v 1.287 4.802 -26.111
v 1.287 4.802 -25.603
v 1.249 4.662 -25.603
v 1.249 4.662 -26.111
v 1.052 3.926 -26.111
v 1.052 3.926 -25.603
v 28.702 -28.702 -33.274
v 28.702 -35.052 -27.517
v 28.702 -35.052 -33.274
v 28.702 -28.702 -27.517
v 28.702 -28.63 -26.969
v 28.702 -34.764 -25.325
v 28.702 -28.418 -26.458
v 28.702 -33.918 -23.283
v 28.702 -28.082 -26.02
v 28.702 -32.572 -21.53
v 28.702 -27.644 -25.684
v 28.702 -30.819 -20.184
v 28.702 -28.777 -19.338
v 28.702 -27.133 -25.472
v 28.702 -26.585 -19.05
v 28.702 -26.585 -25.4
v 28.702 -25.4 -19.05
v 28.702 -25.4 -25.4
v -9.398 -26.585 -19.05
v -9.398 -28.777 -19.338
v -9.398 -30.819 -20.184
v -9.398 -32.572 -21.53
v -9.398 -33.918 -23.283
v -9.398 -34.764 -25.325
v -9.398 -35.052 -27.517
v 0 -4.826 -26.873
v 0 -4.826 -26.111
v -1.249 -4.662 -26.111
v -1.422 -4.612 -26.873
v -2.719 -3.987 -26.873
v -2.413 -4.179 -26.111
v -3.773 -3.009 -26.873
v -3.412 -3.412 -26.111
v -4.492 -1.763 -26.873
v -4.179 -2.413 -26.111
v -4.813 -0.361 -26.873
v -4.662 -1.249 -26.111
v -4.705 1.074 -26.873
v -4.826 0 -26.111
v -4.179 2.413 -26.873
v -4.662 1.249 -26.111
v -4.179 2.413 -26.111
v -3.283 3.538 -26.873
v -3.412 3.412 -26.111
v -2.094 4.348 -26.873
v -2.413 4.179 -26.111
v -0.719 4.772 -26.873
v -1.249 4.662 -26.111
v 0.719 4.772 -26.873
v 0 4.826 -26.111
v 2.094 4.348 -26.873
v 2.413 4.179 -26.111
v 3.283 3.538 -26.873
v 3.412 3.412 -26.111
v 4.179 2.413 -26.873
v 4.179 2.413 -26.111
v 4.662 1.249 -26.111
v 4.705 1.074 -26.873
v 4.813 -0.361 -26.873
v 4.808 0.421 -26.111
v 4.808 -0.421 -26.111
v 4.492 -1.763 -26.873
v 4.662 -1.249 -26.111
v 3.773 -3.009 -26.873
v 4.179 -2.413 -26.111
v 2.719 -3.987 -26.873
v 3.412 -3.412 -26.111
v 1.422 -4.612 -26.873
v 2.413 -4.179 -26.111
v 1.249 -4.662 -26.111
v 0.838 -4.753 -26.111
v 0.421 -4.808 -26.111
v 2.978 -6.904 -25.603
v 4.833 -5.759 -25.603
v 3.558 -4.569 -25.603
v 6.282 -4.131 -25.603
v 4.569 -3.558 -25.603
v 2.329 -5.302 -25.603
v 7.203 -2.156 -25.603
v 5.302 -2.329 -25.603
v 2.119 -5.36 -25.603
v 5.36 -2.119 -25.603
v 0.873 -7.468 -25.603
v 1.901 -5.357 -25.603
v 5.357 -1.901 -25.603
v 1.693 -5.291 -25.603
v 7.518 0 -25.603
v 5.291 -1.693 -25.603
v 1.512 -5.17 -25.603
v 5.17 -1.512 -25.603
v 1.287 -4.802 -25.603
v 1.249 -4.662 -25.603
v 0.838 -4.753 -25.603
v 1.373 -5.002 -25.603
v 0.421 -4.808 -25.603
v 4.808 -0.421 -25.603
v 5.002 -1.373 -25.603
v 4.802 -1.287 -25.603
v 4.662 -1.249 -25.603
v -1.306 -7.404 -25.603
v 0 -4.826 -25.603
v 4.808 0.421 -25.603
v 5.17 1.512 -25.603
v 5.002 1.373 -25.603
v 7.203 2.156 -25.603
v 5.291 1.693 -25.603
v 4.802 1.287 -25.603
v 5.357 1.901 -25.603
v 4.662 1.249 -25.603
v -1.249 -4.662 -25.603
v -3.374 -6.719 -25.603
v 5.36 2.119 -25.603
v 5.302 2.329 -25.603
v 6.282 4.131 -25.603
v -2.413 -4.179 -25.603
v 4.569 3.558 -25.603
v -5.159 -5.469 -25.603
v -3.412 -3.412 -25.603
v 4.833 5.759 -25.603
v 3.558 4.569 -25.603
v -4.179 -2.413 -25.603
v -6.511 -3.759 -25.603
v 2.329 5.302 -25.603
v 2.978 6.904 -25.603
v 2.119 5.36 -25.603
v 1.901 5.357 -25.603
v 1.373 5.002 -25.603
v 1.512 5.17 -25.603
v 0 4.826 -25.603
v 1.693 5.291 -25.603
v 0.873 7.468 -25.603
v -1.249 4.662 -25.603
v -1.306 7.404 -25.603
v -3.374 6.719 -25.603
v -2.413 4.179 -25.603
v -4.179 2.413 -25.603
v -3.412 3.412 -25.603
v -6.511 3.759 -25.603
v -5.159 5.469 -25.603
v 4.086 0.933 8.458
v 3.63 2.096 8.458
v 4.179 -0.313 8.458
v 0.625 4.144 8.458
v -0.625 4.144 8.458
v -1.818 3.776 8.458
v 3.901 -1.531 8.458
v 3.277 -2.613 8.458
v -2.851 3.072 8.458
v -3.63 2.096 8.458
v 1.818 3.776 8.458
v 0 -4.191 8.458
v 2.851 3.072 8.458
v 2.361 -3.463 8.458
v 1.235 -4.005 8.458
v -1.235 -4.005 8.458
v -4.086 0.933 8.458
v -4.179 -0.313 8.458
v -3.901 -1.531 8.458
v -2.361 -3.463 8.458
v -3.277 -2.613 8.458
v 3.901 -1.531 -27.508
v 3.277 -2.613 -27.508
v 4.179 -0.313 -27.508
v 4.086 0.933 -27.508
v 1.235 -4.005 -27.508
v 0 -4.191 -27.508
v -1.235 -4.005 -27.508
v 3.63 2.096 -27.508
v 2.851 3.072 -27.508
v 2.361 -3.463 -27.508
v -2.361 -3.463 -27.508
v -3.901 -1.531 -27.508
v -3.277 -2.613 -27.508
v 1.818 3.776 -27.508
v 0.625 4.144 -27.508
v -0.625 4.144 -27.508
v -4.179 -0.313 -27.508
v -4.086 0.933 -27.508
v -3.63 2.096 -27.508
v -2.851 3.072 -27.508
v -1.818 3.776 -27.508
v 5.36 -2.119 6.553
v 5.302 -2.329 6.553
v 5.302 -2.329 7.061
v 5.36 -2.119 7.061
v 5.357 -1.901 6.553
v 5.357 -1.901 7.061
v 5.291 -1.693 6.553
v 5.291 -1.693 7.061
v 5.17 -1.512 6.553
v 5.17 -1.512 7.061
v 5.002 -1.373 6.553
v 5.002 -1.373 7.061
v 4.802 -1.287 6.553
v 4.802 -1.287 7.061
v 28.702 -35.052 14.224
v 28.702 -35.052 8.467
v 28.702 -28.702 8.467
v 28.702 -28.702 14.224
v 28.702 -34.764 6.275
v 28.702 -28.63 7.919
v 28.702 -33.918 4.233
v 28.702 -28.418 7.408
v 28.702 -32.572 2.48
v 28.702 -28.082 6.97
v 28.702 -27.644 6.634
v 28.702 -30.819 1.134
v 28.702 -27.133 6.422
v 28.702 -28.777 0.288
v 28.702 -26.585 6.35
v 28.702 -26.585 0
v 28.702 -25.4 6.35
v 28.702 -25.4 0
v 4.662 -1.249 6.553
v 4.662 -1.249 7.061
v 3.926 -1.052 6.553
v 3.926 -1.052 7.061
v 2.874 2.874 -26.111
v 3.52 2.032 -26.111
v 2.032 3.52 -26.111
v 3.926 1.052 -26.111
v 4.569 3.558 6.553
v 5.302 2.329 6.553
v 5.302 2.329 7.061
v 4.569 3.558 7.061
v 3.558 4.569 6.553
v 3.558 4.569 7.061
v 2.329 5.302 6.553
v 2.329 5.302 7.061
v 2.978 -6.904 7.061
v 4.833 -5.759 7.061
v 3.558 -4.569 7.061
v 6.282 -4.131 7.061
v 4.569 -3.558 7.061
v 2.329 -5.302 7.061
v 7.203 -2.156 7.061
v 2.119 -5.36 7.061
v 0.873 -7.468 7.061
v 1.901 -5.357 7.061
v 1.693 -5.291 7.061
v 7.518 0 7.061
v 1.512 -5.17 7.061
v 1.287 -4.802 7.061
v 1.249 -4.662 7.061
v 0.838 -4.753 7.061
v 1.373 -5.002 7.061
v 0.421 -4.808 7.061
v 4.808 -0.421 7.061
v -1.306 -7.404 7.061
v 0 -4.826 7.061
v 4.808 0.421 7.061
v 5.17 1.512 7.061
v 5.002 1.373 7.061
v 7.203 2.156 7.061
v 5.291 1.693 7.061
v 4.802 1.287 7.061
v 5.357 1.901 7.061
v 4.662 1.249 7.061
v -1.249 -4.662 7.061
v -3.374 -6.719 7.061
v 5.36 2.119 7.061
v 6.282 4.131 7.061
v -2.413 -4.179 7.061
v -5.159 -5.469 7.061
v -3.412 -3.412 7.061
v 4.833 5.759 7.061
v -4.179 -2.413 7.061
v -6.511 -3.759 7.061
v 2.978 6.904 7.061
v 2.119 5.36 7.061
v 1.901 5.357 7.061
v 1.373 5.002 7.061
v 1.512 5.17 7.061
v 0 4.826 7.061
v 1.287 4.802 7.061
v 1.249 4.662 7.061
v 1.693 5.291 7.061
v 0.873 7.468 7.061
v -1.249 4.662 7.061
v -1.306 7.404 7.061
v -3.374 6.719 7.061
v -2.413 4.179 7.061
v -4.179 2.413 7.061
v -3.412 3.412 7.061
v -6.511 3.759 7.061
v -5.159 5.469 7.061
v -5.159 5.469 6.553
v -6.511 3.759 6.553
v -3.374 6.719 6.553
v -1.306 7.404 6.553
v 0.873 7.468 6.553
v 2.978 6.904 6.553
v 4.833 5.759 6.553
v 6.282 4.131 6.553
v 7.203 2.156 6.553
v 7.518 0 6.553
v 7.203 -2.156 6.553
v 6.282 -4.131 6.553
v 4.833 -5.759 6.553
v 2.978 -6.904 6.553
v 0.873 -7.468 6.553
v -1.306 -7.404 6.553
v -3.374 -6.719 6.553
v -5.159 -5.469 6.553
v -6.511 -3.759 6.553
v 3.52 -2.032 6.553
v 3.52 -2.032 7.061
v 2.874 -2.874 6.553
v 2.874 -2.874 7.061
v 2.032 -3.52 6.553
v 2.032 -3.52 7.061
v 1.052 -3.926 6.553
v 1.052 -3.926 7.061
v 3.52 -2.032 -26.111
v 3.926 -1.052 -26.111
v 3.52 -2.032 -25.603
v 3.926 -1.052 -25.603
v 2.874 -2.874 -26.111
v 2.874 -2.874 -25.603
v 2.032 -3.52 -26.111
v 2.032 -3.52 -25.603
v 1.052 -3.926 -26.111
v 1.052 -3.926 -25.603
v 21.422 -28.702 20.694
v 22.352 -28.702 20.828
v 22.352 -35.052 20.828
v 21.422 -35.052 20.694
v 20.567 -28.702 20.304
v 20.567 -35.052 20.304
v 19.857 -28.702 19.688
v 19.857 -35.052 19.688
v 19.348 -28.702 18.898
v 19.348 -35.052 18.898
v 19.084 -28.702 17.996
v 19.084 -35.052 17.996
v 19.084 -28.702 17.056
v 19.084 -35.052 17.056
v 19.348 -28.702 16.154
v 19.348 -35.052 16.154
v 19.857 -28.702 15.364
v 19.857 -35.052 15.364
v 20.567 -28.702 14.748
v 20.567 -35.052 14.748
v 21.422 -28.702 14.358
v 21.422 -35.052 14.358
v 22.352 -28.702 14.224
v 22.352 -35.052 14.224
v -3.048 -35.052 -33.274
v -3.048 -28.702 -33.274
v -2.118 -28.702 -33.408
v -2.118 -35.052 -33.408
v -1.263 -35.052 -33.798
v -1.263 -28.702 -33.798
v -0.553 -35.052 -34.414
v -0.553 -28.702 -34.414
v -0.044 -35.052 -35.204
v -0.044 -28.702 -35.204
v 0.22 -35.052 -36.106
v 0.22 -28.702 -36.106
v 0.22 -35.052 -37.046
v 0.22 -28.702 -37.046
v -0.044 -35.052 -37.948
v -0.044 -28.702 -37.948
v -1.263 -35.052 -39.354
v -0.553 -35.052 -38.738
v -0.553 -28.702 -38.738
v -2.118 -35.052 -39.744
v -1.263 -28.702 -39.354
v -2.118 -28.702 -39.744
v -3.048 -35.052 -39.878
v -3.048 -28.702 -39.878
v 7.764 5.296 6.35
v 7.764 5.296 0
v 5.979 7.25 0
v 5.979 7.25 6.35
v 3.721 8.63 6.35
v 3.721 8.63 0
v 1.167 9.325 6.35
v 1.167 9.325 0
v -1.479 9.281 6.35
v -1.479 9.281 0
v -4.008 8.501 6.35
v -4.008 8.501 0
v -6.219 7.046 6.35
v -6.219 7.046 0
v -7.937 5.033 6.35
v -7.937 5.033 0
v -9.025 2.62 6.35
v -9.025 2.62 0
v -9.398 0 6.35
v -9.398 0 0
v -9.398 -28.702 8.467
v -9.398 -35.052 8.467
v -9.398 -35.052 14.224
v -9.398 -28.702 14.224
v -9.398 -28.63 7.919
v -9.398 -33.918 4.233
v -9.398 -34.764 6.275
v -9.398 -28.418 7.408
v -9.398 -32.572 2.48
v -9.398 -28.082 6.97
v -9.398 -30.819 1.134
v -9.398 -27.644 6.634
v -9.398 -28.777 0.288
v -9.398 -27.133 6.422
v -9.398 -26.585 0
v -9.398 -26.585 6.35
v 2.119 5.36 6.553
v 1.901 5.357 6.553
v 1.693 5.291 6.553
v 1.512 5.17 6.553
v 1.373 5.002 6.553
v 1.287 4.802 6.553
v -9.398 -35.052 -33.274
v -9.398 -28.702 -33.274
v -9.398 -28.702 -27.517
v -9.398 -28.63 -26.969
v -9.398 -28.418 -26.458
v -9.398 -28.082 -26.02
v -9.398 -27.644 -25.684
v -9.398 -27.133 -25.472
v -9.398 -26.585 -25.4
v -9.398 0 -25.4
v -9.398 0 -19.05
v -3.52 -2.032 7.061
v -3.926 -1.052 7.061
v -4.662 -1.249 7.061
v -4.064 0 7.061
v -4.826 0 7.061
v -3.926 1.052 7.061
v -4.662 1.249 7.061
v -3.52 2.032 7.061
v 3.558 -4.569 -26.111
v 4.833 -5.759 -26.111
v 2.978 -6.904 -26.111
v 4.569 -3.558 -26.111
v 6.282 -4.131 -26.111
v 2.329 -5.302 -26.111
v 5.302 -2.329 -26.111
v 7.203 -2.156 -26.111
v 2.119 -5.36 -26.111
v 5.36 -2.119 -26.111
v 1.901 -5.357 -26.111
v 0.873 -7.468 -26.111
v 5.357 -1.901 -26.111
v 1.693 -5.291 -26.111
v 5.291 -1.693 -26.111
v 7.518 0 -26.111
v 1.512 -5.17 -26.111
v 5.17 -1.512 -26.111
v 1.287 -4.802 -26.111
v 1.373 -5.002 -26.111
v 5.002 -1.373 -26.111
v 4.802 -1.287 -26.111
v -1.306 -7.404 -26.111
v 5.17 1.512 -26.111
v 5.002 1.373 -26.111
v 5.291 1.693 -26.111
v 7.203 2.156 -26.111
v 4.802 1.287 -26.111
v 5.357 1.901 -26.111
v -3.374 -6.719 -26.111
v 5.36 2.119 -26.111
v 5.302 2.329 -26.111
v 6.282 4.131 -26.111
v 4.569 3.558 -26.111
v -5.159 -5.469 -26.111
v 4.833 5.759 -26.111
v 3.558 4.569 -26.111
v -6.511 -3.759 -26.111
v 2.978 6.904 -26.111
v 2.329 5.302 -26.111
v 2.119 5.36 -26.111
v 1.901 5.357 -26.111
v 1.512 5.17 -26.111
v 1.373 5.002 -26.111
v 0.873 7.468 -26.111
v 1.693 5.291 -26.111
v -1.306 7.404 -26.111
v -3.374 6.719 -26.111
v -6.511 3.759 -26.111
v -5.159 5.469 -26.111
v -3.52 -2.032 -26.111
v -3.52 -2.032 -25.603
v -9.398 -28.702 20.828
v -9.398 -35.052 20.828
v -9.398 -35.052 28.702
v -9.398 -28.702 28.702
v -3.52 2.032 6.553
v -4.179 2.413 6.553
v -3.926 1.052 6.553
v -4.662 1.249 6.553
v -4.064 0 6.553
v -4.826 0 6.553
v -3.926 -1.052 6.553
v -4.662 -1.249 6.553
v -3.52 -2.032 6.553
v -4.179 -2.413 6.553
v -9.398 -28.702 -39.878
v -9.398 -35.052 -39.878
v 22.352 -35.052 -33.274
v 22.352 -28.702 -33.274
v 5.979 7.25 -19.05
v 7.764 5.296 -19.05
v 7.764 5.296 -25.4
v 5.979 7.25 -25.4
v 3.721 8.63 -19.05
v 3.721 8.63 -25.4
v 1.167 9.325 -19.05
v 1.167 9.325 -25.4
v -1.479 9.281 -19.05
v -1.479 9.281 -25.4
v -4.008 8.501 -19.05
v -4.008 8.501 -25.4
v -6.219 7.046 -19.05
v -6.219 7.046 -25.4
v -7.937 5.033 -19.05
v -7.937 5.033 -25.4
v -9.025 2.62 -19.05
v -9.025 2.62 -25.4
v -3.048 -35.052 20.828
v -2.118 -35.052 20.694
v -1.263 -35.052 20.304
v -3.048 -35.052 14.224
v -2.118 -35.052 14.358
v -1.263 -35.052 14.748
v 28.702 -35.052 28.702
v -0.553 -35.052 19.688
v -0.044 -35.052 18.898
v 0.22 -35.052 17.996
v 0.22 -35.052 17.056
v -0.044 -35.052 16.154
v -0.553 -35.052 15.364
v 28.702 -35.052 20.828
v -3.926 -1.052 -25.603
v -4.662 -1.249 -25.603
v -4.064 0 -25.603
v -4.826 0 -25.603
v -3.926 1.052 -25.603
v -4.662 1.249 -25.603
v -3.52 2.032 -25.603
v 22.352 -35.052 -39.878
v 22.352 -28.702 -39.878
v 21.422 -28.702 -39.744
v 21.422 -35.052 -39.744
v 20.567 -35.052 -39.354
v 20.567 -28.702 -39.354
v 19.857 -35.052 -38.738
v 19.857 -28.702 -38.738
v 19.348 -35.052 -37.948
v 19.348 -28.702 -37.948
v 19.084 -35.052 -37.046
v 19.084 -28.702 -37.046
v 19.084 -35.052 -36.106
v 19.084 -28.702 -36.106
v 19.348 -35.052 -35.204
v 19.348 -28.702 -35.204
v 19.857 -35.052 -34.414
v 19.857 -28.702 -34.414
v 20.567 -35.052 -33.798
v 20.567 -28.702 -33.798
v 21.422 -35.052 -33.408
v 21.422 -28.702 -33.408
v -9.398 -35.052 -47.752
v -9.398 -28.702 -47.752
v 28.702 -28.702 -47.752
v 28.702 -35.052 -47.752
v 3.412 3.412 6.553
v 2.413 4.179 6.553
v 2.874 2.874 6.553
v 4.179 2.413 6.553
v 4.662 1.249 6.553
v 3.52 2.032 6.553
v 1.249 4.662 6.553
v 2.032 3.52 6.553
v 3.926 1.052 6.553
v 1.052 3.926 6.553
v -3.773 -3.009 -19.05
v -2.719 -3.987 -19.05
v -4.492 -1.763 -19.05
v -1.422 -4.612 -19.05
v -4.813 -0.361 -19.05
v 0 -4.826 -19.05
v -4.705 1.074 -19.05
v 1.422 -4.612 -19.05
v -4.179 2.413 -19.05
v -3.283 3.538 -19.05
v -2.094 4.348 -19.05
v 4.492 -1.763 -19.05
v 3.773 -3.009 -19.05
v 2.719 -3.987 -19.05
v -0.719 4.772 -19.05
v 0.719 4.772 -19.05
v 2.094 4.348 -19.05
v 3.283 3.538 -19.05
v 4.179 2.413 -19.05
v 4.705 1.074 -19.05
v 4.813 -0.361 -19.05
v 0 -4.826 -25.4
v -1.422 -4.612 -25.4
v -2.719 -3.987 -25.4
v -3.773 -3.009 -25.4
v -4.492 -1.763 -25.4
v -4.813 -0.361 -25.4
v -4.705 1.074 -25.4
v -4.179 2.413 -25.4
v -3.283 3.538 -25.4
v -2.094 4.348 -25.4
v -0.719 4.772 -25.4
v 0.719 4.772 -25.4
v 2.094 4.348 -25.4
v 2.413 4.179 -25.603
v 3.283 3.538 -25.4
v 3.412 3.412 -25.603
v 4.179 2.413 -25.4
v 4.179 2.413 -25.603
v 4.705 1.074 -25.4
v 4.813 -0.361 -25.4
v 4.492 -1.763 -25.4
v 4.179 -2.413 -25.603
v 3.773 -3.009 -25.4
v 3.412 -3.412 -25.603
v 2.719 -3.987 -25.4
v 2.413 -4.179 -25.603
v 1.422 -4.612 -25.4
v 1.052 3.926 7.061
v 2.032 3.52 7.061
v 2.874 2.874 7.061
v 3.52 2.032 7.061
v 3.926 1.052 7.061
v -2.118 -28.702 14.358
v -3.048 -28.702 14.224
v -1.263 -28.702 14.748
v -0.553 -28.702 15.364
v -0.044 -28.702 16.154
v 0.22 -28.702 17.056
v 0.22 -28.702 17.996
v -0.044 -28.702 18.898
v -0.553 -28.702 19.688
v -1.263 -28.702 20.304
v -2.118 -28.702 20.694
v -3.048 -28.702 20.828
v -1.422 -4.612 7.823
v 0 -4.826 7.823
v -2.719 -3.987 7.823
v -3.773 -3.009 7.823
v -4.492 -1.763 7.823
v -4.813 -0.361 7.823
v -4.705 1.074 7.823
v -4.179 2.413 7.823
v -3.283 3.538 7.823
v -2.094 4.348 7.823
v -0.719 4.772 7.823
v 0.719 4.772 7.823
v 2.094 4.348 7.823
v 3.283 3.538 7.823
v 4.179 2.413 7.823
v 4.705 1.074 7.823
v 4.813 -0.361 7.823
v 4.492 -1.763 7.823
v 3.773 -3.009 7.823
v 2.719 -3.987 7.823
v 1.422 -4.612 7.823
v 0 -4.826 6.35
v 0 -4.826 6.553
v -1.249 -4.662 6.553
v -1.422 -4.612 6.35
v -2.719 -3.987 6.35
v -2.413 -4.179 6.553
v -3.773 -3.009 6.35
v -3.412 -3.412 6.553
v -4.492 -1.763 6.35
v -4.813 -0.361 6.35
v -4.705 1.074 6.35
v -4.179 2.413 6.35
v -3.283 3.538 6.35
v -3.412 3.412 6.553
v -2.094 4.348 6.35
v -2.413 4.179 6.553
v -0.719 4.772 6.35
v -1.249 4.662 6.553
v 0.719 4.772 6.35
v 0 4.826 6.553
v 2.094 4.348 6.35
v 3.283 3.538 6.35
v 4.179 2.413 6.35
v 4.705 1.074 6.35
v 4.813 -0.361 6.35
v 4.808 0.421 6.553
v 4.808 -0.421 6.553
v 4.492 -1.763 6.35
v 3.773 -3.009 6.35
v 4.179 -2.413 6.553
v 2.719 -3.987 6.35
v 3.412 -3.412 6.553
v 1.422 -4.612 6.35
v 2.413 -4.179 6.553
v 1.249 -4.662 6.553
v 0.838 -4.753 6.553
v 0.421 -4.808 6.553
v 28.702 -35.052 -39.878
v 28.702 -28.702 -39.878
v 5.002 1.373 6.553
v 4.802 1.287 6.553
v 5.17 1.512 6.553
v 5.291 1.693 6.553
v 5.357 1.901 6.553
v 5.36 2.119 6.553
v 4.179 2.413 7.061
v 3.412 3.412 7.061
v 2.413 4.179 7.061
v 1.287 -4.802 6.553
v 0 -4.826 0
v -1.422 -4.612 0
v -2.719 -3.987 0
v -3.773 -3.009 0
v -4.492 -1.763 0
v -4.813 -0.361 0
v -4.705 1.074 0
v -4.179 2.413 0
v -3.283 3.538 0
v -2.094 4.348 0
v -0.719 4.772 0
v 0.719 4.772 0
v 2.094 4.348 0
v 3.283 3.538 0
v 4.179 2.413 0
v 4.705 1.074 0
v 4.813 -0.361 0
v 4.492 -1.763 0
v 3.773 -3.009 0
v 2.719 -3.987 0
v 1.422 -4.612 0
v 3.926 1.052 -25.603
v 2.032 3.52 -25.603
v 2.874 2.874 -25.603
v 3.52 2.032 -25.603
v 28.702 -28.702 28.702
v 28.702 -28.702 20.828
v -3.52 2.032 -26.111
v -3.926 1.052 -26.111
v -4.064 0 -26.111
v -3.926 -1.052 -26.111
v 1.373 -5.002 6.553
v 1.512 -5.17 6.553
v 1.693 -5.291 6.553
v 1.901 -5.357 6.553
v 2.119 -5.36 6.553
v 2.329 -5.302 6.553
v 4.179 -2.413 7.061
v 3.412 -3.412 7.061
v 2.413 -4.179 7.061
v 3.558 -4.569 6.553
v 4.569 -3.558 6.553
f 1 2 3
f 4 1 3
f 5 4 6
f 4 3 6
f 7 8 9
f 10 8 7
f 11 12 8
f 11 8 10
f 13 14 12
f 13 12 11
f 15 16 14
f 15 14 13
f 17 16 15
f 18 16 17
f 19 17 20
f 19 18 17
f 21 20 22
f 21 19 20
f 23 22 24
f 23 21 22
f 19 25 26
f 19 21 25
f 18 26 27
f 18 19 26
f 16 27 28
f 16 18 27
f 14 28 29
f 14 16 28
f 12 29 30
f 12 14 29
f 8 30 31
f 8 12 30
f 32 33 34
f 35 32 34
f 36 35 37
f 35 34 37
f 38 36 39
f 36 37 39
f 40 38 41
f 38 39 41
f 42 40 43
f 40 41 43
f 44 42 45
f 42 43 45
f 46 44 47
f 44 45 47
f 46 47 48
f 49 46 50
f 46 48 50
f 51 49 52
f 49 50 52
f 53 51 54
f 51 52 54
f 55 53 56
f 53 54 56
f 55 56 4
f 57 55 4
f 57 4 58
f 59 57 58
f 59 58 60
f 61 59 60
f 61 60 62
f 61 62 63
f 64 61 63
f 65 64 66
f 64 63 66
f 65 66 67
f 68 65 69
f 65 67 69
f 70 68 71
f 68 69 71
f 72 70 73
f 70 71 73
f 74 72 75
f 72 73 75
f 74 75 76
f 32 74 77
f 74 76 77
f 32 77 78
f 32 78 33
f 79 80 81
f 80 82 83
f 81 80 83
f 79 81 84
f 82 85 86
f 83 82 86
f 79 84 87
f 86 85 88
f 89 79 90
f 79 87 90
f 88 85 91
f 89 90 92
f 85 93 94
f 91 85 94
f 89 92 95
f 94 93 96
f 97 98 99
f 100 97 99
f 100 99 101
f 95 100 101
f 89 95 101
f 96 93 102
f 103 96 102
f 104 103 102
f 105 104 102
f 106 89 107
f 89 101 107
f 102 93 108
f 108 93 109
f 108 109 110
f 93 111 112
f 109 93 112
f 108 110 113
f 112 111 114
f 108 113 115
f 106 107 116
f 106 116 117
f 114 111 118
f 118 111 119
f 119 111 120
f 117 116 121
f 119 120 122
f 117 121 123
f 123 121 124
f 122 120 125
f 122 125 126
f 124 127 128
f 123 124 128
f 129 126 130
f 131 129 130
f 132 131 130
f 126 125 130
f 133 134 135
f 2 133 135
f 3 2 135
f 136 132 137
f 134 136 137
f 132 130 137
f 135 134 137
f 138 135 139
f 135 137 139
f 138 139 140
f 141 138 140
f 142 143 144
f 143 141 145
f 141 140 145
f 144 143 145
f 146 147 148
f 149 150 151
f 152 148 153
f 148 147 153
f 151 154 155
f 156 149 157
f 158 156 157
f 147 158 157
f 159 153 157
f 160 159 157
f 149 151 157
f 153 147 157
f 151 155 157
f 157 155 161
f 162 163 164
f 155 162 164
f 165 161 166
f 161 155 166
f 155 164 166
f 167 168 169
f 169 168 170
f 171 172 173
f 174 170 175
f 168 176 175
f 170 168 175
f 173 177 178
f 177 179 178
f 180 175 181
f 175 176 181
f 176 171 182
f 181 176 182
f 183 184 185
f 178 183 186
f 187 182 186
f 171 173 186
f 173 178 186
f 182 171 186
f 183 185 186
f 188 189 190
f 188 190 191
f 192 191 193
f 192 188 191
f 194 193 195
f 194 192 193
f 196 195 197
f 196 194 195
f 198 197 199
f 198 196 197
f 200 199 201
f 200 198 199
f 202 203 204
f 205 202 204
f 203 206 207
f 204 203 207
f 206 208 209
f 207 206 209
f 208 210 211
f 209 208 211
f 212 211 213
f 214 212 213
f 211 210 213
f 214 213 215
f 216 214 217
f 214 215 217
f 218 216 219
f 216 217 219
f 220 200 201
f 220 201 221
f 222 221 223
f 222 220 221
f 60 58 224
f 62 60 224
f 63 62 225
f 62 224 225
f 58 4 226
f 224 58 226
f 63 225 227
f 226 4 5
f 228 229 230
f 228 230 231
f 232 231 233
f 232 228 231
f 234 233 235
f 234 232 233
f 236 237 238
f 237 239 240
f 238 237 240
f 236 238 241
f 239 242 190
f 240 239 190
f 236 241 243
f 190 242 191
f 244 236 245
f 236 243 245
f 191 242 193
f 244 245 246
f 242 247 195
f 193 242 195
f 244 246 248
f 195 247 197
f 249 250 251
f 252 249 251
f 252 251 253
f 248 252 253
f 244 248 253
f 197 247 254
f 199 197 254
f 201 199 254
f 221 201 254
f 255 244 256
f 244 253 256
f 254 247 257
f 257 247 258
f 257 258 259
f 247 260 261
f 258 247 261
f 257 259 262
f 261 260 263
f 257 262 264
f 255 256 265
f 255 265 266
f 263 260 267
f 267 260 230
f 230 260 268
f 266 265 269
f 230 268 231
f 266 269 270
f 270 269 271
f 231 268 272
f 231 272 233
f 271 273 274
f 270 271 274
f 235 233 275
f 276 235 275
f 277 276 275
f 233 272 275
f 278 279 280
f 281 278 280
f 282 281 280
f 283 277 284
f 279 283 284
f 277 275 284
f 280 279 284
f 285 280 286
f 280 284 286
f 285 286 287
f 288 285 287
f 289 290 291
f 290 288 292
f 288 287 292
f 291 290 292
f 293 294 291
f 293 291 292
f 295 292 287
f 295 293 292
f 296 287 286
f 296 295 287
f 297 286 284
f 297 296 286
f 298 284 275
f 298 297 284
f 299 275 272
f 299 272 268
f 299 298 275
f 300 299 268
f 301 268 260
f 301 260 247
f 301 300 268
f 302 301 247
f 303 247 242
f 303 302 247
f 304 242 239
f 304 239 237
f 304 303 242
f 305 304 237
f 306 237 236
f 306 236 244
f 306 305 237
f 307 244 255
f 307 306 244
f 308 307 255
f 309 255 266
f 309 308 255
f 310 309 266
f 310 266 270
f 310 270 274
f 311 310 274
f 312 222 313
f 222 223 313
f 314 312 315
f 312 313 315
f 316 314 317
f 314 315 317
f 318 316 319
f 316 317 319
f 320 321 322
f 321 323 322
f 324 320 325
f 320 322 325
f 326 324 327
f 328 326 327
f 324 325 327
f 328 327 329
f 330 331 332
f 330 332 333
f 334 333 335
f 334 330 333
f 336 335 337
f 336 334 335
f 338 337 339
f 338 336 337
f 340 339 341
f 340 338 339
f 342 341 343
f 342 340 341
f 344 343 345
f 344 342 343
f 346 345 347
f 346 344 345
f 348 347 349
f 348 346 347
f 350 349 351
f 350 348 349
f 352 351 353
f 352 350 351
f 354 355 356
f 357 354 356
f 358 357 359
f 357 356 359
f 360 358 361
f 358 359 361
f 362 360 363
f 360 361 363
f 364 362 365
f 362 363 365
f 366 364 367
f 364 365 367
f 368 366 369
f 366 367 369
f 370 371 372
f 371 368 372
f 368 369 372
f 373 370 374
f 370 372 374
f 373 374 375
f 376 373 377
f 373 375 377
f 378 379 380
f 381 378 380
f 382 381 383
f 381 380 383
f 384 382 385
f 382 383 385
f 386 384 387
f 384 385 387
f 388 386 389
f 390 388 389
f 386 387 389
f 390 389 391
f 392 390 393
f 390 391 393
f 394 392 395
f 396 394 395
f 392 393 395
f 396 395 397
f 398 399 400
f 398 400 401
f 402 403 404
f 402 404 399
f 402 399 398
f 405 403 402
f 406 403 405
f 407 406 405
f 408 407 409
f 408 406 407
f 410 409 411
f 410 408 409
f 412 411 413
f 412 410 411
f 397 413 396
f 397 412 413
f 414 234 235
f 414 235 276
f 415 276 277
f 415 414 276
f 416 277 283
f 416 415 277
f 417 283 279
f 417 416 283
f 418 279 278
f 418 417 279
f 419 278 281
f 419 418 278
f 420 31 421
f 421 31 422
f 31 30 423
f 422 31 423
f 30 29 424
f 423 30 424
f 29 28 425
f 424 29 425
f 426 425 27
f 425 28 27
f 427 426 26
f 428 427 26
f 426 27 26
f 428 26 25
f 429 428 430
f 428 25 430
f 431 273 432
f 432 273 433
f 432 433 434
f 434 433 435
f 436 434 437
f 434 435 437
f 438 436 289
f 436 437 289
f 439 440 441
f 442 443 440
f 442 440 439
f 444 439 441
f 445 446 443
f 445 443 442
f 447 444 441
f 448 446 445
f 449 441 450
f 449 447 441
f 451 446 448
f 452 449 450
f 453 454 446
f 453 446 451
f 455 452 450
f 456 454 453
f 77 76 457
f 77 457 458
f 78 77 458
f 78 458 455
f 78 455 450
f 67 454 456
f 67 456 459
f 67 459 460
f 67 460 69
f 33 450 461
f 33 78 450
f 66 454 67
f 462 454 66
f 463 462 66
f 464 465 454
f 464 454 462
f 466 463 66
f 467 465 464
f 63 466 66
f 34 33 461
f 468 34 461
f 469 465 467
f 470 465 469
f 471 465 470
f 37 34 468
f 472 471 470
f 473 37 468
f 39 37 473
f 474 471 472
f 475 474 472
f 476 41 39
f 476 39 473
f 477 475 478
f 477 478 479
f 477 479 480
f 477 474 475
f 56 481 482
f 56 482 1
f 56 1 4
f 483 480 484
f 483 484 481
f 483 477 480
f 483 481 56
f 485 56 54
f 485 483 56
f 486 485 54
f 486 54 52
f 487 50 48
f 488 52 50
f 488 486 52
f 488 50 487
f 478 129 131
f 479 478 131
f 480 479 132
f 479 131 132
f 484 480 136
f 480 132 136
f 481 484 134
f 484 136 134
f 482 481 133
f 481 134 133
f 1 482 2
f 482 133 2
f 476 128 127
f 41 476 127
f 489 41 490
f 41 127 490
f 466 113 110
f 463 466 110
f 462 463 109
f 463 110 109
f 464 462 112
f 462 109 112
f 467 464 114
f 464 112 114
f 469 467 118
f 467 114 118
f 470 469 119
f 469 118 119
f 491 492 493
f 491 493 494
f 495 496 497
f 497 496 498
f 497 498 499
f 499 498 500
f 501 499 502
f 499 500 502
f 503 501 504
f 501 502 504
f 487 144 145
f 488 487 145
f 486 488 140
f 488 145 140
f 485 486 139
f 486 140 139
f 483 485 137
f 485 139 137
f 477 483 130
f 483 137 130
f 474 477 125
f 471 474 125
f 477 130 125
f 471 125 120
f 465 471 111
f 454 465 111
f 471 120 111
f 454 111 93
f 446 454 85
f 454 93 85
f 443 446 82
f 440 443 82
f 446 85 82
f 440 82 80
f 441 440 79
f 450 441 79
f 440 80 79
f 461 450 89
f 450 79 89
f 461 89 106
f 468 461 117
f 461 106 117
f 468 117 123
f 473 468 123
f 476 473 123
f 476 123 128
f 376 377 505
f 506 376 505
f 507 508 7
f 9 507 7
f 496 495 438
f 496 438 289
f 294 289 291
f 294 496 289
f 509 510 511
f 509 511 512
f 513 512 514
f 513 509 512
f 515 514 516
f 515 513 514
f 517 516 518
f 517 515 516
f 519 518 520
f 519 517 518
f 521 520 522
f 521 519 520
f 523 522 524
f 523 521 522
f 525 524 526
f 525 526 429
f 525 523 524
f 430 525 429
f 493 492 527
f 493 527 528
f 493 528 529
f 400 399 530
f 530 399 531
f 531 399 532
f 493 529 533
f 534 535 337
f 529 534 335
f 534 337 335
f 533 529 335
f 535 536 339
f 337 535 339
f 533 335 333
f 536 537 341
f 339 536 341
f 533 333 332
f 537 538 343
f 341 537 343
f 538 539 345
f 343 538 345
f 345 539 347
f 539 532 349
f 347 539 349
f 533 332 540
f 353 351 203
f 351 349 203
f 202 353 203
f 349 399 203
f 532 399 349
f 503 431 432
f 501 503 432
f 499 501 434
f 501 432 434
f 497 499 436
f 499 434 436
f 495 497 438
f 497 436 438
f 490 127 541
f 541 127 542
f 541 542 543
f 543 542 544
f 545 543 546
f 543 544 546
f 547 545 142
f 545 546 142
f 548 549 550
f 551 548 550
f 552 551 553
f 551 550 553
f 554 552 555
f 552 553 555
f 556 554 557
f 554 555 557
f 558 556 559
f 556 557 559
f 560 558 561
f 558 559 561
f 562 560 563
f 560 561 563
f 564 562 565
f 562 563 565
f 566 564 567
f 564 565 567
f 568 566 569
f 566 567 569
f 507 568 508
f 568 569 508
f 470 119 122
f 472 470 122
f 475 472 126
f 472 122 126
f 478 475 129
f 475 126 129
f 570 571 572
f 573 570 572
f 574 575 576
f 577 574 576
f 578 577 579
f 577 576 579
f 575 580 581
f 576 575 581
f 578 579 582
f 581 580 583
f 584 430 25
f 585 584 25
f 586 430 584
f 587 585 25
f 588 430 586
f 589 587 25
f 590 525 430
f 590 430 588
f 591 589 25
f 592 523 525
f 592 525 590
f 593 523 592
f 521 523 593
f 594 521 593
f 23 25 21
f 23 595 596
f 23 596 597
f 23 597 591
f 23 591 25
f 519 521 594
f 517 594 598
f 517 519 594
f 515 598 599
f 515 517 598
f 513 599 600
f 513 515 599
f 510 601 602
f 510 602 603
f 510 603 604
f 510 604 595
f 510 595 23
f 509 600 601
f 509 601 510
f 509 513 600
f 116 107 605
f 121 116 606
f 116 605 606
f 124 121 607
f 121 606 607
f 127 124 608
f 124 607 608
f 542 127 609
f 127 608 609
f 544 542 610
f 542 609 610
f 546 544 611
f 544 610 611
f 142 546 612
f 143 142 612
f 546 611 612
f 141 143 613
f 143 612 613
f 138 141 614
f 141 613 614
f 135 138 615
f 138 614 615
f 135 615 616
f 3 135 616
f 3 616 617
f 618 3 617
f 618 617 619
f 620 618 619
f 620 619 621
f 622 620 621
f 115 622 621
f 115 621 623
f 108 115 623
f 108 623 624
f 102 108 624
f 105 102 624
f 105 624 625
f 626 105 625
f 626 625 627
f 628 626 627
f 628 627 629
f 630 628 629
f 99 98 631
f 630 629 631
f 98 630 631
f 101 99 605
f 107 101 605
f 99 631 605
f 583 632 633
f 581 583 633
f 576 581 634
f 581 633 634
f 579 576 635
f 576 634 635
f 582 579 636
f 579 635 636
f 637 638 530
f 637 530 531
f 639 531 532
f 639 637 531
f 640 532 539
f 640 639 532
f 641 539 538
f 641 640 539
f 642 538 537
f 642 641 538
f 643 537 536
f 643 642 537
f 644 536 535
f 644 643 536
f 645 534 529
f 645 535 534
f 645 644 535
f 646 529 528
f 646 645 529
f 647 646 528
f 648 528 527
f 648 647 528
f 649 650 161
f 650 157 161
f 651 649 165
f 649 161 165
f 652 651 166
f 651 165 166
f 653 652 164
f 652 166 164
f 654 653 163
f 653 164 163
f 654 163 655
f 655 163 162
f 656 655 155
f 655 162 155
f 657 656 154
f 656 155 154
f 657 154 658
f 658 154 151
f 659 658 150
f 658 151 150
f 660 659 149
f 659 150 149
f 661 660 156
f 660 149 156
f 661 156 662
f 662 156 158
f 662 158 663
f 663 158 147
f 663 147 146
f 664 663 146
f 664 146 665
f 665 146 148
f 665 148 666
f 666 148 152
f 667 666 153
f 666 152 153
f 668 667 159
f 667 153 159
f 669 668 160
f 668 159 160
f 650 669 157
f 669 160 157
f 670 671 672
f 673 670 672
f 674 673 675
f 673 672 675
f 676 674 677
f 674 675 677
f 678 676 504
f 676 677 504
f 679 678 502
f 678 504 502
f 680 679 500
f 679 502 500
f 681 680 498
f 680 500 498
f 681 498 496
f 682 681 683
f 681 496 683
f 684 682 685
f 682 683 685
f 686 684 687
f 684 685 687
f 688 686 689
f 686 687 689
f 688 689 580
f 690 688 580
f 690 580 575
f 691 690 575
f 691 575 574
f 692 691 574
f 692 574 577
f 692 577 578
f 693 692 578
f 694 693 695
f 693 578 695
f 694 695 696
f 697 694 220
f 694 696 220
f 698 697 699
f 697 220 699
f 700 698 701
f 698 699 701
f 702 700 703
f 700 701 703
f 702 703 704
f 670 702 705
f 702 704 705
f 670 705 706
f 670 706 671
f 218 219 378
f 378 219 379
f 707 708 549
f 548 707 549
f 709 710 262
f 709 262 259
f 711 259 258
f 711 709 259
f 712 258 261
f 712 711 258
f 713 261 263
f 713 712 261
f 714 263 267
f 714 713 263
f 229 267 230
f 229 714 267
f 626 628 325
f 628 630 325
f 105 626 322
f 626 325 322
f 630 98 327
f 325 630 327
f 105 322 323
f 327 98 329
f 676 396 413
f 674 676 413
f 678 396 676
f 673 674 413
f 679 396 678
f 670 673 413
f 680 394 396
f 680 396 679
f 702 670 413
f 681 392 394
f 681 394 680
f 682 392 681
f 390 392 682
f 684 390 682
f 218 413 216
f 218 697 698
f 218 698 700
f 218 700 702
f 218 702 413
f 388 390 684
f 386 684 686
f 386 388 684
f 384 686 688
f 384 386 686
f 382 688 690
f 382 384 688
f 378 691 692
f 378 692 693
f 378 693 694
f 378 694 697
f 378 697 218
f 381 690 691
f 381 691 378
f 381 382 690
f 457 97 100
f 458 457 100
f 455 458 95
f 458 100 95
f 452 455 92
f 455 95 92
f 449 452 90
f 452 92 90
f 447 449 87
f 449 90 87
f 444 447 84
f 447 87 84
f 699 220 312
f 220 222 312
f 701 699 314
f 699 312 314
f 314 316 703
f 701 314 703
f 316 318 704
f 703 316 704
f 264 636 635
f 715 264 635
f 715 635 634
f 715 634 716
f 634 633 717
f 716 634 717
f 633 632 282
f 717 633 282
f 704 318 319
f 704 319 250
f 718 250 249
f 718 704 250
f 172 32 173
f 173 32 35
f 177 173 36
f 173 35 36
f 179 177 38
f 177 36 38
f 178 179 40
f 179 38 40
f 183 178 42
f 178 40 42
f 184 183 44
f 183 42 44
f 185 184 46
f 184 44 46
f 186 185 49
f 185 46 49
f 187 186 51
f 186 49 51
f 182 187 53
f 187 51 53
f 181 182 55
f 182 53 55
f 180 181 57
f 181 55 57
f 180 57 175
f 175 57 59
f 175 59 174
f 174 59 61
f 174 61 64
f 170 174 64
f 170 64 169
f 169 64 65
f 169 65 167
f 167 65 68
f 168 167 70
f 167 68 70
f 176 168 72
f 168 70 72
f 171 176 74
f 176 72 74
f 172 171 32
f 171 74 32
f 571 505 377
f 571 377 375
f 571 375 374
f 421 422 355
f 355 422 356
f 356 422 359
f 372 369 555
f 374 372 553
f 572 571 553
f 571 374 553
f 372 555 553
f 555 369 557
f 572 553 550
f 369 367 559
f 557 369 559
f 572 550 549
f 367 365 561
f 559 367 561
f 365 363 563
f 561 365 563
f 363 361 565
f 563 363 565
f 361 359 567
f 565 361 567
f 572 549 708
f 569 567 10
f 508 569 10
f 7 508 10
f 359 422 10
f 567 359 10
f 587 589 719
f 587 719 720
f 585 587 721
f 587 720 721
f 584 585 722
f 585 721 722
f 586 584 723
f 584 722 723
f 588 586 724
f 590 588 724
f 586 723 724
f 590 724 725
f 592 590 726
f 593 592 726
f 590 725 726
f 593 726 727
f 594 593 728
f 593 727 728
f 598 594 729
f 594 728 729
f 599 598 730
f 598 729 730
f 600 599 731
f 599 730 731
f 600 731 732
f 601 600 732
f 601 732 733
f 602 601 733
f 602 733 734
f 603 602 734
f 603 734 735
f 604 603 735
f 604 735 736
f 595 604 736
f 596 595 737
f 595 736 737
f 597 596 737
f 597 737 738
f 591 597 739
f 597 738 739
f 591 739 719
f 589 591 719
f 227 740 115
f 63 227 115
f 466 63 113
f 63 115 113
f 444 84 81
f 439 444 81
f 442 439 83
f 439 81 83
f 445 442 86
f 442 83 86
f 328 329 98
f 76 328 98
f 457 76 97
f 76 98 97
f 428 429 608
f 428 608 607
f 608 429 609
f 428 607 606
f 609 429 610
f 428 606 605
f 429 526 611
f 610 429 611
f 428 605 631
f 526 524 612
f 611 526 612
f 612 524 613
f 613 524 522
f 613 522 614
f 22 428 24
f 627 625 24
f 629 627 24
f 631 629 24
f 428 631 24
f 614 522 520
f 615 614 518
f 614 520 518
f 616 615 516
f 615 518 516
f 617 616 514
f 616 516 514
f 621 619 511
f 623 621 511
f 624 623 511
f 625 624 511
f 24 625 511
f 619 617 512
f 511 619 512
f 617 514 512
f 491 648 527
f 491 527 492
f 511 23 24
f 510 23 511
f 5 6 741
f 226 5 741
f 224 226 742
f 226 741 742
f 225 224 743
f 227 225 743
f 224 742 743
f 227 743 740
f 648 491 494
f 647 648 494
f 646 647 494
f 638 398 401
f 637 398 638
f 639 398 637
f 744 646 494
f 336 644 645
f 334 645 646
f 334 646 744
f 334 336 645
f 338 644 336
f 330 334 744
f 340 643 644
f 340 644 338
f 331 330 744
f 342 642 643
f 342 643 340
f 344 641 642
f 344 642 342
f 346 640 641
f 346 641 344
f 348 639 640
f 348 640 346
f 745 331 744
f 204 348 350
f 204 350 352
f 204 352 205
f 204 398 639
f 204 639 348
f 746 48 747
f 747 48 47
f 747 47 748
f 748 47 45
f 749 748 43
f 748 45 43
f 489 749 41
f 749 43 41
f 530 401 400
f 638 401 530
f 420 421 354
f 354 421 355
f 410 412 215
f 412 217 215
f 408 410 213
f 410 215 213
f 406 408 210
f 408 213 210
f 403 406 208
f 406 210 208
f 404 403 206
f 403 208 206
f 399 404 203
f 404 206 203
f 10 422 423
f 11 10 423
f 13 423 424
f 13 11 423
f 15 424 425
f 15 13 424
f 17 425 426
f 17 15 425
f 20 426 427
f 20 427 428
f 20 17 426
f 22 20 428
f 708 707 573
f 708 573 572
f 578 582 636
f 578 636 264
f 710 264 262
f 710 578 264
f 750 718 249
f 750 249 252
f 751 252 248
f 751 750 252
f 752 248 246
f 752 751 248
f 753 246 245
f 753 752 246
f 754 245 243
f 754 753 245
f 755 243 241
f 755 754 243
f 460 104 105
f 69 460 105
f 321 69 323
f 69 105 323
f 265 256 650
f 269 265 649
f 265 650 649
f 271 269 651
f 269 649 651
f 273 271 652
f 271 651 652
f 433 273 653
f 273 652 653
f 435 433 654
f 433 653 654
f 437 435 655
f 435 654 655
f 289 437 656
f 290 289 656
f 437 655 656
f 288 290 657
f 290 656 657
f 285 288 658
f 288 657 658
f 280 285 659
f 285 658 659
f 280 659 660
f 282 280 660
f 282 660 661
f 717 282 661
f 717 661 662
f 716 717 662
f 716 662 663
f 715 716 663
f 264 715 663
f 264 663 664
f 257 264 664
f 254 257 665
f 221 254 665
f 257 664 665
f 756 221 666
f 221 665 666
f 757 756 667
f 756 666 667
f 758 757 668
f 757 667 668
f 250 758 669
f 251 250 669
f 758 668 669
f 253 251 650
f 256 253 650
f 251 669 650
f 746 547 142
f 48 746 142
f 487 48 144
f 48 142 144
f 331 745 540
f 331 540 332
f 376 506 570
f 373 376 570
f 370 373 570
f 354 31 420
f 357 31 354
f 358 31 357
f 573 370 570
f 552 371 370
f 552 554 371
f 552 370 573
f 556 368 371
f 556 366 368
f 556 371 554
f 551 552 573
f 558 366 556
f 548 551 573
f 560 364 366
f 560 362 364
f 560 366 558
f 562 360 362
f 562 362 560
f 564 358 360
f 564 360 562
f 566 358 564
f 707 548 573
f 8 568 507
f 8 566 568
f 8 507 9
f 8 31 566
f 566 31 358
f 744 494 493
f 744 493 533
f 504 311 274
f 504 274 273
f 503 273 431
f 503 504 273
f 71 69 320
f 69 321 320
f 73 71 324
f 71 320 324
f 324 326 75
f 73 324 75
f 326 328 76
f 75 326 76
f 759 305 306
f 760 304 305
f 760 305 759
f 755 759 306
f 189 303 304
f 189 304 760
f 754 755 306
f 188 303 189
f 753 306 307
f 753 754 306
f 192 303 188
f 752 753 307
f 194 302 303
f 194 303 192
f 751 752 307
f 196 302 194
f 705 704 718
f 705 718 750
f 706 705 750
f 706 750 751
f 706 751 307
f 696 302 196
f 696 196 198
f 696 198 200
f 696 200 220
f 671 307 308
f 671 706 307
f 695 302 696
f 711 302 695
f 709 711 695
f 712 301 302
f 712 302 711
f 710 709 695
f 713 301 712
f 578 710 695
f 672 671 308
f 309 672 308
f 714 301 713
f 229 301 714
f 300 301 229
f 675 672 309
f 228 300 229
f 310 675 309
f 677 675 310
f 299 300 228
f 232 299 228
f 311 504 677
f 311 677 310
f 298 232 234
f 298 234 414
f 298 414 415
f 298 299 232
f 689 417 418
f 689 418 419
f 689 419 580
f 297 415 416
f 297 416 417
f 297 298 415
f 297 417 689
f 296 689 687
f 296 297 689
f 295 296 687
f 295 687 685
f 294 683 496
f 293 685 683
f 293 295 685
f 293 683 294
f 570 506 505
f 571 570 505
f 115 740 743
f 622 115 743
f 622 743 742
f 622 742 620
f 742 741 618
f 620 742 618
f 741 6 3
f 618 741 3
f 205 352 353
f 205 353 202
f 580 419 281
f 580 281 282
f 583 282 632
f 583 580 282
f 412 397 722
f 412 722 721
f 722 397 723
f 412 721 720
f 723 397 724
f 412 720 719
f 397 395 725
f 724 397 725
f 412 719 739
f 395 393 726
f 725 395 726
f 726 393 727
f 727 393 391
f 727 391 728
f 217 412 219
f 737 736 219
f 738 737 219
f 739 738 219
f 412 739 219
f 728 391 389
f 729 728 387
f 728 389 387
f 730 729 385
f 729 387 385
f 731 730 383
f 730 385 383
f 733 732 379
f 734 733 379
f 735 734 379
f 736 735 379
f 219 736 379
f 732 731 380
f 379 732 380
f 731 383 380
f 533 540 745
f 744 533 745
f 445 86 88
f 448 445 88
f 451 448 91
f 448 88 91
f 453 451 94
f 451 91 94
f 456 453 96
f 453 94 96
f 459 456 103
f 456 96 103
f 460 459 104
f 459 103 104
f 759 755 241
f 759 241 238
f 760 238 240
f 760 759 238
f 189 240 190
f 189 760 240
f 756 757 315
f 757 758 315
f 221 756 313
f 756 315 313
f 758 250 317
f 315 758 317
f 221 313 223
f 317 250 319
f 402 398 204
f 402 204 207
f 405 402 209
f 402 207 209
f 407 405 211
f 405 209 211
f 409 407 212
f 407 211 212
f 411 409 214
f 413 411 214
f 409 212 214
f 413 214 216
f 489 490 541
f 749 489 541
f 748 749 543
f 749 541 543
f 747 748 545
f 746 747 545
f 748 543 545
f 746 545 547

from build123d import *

# Parameters (mm, degrees)
SKETCH3_R           = 4.826
BOSS_EXTRUDE1_DEPTH = 6.35
SKETCH4_W           = 38.1
SKETCH4_H           = 6.35
BOSS_EXTRUDE2_DEPTH = 22.352
CUT_EXTRUDE1_DEPTH  = 56.67063506
FILLET1_R           = 2.116666667
FILLET2_R           = 8.466666667
BOSS_EXTRUDE3_DEPTH = 0.508


with BuildPart() as part:
    # Sketch3 → Boss-Extrude1 (new body)
    with BuildSketch(Plane.XY):
        with BuildLine():
            Line((-9.398, 0), (-9.398, -35.052))
            Line((-9.398, -35.052), (28.702, -35.052))
            Line((28.702, -35.052), (28.702, -25.4))
            Line((28.702, -25.4), (7.763798393, 5.295832184))
            ThreePointArc((7.763798393, 5.295832184), (-2.771121317, 8.980160948), (-9.398, 0))
        make_face()
        Circle(SKETCH3_R, mode=Mode.SUBTRACT)
    extrude(amount=BOSS_EXTRUDE1_DEPTH)

    # Sketch4 → Boss-Extrude2 (add)
    with BuildSketch(Plane.XY.offset(6.35)):
        with Locations((9.652, -31.877)):
            Rectangle(SKETCH4_W, SKETCH4_H)
    extrude(amount=BOSS_EXTRUDE2_DEPTH)

    # Sketch5 → Cut-Extrude1 (cut, through all)
    with BuildSketch(Plane(origin=(0, -28.702, 0), x_dir=(1, 0, 0), z_dir=(0, 1, 0))):
        with BuildLine():
            Line((-3.048, -20.828), (-9.398, -20.828))
            Line((-9.398, -20.828), (-9.398, -14.224))
            Line((-9.398, -14.224), (-3.048, -14.224))
            ThreePointArc((-3.048, -14.224), (0.254, -17.526), (-3.048, -20.828))
        make_face()
        with BuildLine():
            Line((22.352, -14.224), (28.702, -14.224))
            Line((28.702, -14.224), (28.702, -20.828))
            Line((28.702, -20.828), (22.352, -20.828))
            ThreePointArc((22.352, -20.828), (19.05, -17.526), (22.352, -14.224))
        make_face()
    extrude(amount=-CUT_EXTRUDE1_DEPTH, mode=Mode.SUBTRACT)

    # Fillet1
    fillet1_edges = [part.edges().sort_by_distance(p)[0] for p in [
        (9.652, -28.702, 6.35),
    ]]
    fillet(fillet1_edges, radius=FILLET1_R)

    # Fillet2
    fillet2_edges = [part.edges().sort_by_distance(p)[0] for p in [
        (9.652, -35.052, 0),
    ]]
    fillet(fillet2_edges, radius=FILLET2_R)


with BuildPart() as body_2:
    # Mirror2: mirrored copy
    add(part.part.mirror(Plane.XY.offset(-9.525)))


with BuildPart() as part_1:
    add(part.part)

    add(body_2.part)  # Revolve1 merges body 2
    # Sketch6 → Revolve1 (revolve)
    with BuildSketch(Plane(origin=(0, 0, 0), x_dir=(0, 0, -1), z_dir=(1, 0, 0)), mode=Mode.PRIVATE) as revolve1_sk:
        Polygon((-8.4582, 0), (27.5082, 0), (27.5082, 4.191), (26.8732, 4.826), (26.1112, 4.826), (26.1112, 4.064), (25.6032, 4.064), (25.6032, 4.826), (-6.5532, 4.826), (-6.5532, 4.064), (-7.0612, 4.064), (-7.0612, 4.826), (-7.8232, 4.826), (-8.4582, 4.191), align=None)
    revolve(revolve1_sk.sketch.rotate(Axis((0, 0, 8.4582), (0, 0, -1)), 180), axis=Axis((0, 0, 8.4582), (0, 0, -1)))

    # Sketch7 → Boss-Extrude3 (add)
    with BuildSketch(Plane(origin=(0, 0, -25.6032), x_dir=(-1, 0, 0), z_dir=(0, 0, -1))):
        with BuildLine():
            Line((3.519527241, 2.032), (6.511125396, 3.7592))
            ThreePointArc((6.511125396, 3.7592), (-7.5184, 0), (6.511125396, -3.7592))
            Line((6.511125396, -3.7592), (3.519527241, -2.032))
            ThreePointArc((3.519527241, -2.032), (1.555225469, -3.75464642), (-1.051840599, -3.925522558))
            Line((-1.051840599, -3.925522558), (-1.286625076, -4.801750155))
            ThreePointArc((-1.286625076, -4.801750155), (-1.692900021, -5.291481271), (-2.329124277, -5.30218611))
            ThreePointArc((-2.329124277, -5.30218611), (-4.094996791, -4.094996791), (-5.30218611, -2.329124277))
            ThreePointArc((-5.30218611, -2.329124277), (-5.291481271, -1.692900021), (-4.801750155, -1.286625076))
            Line((-4.801750155, -1.286625076), (-3.925522558, -1.051840599))
            ThreePointArc((-3.925522558, -1.051840599), (-4.064, 0), (-3.925522558, 1.051840599))
            Line((-3.925522558, 1.051840599), (-4.801750155, 1.286625076))
            ThreePointArc((-4.801750155, 1.286625076), (-5.291481271, 1.692900021), (-5.30218611, 2.329124277))
            ThreePointArc((-5.30218611, 2.329124277), (-4.094996791, 4.094996791), (-2.329124277, 5.30218611))
            ThreePointArc((-2.329124277, 5.30218611), (-1.692900021, 5.291481271), (-1.286625076, 4.801750155))
            Line((-1.286625076, 4.801750155), (-1.051840599, 3.925522558))
            ThreePointArc((-1.051840599, 3.925522558), (1.555225469, 3.75464642), (3.519527241, 2.032))
        make_face()
    boss_extrude3 = extrude(amount=BOSS_EXTRUDE3_DEPTH)

    # Mirror3: Boss-Extrude3 across plane
    add(boss_extrude3.mirror(Plane.XY.offset(-9.525)))


solid = part_1.part
